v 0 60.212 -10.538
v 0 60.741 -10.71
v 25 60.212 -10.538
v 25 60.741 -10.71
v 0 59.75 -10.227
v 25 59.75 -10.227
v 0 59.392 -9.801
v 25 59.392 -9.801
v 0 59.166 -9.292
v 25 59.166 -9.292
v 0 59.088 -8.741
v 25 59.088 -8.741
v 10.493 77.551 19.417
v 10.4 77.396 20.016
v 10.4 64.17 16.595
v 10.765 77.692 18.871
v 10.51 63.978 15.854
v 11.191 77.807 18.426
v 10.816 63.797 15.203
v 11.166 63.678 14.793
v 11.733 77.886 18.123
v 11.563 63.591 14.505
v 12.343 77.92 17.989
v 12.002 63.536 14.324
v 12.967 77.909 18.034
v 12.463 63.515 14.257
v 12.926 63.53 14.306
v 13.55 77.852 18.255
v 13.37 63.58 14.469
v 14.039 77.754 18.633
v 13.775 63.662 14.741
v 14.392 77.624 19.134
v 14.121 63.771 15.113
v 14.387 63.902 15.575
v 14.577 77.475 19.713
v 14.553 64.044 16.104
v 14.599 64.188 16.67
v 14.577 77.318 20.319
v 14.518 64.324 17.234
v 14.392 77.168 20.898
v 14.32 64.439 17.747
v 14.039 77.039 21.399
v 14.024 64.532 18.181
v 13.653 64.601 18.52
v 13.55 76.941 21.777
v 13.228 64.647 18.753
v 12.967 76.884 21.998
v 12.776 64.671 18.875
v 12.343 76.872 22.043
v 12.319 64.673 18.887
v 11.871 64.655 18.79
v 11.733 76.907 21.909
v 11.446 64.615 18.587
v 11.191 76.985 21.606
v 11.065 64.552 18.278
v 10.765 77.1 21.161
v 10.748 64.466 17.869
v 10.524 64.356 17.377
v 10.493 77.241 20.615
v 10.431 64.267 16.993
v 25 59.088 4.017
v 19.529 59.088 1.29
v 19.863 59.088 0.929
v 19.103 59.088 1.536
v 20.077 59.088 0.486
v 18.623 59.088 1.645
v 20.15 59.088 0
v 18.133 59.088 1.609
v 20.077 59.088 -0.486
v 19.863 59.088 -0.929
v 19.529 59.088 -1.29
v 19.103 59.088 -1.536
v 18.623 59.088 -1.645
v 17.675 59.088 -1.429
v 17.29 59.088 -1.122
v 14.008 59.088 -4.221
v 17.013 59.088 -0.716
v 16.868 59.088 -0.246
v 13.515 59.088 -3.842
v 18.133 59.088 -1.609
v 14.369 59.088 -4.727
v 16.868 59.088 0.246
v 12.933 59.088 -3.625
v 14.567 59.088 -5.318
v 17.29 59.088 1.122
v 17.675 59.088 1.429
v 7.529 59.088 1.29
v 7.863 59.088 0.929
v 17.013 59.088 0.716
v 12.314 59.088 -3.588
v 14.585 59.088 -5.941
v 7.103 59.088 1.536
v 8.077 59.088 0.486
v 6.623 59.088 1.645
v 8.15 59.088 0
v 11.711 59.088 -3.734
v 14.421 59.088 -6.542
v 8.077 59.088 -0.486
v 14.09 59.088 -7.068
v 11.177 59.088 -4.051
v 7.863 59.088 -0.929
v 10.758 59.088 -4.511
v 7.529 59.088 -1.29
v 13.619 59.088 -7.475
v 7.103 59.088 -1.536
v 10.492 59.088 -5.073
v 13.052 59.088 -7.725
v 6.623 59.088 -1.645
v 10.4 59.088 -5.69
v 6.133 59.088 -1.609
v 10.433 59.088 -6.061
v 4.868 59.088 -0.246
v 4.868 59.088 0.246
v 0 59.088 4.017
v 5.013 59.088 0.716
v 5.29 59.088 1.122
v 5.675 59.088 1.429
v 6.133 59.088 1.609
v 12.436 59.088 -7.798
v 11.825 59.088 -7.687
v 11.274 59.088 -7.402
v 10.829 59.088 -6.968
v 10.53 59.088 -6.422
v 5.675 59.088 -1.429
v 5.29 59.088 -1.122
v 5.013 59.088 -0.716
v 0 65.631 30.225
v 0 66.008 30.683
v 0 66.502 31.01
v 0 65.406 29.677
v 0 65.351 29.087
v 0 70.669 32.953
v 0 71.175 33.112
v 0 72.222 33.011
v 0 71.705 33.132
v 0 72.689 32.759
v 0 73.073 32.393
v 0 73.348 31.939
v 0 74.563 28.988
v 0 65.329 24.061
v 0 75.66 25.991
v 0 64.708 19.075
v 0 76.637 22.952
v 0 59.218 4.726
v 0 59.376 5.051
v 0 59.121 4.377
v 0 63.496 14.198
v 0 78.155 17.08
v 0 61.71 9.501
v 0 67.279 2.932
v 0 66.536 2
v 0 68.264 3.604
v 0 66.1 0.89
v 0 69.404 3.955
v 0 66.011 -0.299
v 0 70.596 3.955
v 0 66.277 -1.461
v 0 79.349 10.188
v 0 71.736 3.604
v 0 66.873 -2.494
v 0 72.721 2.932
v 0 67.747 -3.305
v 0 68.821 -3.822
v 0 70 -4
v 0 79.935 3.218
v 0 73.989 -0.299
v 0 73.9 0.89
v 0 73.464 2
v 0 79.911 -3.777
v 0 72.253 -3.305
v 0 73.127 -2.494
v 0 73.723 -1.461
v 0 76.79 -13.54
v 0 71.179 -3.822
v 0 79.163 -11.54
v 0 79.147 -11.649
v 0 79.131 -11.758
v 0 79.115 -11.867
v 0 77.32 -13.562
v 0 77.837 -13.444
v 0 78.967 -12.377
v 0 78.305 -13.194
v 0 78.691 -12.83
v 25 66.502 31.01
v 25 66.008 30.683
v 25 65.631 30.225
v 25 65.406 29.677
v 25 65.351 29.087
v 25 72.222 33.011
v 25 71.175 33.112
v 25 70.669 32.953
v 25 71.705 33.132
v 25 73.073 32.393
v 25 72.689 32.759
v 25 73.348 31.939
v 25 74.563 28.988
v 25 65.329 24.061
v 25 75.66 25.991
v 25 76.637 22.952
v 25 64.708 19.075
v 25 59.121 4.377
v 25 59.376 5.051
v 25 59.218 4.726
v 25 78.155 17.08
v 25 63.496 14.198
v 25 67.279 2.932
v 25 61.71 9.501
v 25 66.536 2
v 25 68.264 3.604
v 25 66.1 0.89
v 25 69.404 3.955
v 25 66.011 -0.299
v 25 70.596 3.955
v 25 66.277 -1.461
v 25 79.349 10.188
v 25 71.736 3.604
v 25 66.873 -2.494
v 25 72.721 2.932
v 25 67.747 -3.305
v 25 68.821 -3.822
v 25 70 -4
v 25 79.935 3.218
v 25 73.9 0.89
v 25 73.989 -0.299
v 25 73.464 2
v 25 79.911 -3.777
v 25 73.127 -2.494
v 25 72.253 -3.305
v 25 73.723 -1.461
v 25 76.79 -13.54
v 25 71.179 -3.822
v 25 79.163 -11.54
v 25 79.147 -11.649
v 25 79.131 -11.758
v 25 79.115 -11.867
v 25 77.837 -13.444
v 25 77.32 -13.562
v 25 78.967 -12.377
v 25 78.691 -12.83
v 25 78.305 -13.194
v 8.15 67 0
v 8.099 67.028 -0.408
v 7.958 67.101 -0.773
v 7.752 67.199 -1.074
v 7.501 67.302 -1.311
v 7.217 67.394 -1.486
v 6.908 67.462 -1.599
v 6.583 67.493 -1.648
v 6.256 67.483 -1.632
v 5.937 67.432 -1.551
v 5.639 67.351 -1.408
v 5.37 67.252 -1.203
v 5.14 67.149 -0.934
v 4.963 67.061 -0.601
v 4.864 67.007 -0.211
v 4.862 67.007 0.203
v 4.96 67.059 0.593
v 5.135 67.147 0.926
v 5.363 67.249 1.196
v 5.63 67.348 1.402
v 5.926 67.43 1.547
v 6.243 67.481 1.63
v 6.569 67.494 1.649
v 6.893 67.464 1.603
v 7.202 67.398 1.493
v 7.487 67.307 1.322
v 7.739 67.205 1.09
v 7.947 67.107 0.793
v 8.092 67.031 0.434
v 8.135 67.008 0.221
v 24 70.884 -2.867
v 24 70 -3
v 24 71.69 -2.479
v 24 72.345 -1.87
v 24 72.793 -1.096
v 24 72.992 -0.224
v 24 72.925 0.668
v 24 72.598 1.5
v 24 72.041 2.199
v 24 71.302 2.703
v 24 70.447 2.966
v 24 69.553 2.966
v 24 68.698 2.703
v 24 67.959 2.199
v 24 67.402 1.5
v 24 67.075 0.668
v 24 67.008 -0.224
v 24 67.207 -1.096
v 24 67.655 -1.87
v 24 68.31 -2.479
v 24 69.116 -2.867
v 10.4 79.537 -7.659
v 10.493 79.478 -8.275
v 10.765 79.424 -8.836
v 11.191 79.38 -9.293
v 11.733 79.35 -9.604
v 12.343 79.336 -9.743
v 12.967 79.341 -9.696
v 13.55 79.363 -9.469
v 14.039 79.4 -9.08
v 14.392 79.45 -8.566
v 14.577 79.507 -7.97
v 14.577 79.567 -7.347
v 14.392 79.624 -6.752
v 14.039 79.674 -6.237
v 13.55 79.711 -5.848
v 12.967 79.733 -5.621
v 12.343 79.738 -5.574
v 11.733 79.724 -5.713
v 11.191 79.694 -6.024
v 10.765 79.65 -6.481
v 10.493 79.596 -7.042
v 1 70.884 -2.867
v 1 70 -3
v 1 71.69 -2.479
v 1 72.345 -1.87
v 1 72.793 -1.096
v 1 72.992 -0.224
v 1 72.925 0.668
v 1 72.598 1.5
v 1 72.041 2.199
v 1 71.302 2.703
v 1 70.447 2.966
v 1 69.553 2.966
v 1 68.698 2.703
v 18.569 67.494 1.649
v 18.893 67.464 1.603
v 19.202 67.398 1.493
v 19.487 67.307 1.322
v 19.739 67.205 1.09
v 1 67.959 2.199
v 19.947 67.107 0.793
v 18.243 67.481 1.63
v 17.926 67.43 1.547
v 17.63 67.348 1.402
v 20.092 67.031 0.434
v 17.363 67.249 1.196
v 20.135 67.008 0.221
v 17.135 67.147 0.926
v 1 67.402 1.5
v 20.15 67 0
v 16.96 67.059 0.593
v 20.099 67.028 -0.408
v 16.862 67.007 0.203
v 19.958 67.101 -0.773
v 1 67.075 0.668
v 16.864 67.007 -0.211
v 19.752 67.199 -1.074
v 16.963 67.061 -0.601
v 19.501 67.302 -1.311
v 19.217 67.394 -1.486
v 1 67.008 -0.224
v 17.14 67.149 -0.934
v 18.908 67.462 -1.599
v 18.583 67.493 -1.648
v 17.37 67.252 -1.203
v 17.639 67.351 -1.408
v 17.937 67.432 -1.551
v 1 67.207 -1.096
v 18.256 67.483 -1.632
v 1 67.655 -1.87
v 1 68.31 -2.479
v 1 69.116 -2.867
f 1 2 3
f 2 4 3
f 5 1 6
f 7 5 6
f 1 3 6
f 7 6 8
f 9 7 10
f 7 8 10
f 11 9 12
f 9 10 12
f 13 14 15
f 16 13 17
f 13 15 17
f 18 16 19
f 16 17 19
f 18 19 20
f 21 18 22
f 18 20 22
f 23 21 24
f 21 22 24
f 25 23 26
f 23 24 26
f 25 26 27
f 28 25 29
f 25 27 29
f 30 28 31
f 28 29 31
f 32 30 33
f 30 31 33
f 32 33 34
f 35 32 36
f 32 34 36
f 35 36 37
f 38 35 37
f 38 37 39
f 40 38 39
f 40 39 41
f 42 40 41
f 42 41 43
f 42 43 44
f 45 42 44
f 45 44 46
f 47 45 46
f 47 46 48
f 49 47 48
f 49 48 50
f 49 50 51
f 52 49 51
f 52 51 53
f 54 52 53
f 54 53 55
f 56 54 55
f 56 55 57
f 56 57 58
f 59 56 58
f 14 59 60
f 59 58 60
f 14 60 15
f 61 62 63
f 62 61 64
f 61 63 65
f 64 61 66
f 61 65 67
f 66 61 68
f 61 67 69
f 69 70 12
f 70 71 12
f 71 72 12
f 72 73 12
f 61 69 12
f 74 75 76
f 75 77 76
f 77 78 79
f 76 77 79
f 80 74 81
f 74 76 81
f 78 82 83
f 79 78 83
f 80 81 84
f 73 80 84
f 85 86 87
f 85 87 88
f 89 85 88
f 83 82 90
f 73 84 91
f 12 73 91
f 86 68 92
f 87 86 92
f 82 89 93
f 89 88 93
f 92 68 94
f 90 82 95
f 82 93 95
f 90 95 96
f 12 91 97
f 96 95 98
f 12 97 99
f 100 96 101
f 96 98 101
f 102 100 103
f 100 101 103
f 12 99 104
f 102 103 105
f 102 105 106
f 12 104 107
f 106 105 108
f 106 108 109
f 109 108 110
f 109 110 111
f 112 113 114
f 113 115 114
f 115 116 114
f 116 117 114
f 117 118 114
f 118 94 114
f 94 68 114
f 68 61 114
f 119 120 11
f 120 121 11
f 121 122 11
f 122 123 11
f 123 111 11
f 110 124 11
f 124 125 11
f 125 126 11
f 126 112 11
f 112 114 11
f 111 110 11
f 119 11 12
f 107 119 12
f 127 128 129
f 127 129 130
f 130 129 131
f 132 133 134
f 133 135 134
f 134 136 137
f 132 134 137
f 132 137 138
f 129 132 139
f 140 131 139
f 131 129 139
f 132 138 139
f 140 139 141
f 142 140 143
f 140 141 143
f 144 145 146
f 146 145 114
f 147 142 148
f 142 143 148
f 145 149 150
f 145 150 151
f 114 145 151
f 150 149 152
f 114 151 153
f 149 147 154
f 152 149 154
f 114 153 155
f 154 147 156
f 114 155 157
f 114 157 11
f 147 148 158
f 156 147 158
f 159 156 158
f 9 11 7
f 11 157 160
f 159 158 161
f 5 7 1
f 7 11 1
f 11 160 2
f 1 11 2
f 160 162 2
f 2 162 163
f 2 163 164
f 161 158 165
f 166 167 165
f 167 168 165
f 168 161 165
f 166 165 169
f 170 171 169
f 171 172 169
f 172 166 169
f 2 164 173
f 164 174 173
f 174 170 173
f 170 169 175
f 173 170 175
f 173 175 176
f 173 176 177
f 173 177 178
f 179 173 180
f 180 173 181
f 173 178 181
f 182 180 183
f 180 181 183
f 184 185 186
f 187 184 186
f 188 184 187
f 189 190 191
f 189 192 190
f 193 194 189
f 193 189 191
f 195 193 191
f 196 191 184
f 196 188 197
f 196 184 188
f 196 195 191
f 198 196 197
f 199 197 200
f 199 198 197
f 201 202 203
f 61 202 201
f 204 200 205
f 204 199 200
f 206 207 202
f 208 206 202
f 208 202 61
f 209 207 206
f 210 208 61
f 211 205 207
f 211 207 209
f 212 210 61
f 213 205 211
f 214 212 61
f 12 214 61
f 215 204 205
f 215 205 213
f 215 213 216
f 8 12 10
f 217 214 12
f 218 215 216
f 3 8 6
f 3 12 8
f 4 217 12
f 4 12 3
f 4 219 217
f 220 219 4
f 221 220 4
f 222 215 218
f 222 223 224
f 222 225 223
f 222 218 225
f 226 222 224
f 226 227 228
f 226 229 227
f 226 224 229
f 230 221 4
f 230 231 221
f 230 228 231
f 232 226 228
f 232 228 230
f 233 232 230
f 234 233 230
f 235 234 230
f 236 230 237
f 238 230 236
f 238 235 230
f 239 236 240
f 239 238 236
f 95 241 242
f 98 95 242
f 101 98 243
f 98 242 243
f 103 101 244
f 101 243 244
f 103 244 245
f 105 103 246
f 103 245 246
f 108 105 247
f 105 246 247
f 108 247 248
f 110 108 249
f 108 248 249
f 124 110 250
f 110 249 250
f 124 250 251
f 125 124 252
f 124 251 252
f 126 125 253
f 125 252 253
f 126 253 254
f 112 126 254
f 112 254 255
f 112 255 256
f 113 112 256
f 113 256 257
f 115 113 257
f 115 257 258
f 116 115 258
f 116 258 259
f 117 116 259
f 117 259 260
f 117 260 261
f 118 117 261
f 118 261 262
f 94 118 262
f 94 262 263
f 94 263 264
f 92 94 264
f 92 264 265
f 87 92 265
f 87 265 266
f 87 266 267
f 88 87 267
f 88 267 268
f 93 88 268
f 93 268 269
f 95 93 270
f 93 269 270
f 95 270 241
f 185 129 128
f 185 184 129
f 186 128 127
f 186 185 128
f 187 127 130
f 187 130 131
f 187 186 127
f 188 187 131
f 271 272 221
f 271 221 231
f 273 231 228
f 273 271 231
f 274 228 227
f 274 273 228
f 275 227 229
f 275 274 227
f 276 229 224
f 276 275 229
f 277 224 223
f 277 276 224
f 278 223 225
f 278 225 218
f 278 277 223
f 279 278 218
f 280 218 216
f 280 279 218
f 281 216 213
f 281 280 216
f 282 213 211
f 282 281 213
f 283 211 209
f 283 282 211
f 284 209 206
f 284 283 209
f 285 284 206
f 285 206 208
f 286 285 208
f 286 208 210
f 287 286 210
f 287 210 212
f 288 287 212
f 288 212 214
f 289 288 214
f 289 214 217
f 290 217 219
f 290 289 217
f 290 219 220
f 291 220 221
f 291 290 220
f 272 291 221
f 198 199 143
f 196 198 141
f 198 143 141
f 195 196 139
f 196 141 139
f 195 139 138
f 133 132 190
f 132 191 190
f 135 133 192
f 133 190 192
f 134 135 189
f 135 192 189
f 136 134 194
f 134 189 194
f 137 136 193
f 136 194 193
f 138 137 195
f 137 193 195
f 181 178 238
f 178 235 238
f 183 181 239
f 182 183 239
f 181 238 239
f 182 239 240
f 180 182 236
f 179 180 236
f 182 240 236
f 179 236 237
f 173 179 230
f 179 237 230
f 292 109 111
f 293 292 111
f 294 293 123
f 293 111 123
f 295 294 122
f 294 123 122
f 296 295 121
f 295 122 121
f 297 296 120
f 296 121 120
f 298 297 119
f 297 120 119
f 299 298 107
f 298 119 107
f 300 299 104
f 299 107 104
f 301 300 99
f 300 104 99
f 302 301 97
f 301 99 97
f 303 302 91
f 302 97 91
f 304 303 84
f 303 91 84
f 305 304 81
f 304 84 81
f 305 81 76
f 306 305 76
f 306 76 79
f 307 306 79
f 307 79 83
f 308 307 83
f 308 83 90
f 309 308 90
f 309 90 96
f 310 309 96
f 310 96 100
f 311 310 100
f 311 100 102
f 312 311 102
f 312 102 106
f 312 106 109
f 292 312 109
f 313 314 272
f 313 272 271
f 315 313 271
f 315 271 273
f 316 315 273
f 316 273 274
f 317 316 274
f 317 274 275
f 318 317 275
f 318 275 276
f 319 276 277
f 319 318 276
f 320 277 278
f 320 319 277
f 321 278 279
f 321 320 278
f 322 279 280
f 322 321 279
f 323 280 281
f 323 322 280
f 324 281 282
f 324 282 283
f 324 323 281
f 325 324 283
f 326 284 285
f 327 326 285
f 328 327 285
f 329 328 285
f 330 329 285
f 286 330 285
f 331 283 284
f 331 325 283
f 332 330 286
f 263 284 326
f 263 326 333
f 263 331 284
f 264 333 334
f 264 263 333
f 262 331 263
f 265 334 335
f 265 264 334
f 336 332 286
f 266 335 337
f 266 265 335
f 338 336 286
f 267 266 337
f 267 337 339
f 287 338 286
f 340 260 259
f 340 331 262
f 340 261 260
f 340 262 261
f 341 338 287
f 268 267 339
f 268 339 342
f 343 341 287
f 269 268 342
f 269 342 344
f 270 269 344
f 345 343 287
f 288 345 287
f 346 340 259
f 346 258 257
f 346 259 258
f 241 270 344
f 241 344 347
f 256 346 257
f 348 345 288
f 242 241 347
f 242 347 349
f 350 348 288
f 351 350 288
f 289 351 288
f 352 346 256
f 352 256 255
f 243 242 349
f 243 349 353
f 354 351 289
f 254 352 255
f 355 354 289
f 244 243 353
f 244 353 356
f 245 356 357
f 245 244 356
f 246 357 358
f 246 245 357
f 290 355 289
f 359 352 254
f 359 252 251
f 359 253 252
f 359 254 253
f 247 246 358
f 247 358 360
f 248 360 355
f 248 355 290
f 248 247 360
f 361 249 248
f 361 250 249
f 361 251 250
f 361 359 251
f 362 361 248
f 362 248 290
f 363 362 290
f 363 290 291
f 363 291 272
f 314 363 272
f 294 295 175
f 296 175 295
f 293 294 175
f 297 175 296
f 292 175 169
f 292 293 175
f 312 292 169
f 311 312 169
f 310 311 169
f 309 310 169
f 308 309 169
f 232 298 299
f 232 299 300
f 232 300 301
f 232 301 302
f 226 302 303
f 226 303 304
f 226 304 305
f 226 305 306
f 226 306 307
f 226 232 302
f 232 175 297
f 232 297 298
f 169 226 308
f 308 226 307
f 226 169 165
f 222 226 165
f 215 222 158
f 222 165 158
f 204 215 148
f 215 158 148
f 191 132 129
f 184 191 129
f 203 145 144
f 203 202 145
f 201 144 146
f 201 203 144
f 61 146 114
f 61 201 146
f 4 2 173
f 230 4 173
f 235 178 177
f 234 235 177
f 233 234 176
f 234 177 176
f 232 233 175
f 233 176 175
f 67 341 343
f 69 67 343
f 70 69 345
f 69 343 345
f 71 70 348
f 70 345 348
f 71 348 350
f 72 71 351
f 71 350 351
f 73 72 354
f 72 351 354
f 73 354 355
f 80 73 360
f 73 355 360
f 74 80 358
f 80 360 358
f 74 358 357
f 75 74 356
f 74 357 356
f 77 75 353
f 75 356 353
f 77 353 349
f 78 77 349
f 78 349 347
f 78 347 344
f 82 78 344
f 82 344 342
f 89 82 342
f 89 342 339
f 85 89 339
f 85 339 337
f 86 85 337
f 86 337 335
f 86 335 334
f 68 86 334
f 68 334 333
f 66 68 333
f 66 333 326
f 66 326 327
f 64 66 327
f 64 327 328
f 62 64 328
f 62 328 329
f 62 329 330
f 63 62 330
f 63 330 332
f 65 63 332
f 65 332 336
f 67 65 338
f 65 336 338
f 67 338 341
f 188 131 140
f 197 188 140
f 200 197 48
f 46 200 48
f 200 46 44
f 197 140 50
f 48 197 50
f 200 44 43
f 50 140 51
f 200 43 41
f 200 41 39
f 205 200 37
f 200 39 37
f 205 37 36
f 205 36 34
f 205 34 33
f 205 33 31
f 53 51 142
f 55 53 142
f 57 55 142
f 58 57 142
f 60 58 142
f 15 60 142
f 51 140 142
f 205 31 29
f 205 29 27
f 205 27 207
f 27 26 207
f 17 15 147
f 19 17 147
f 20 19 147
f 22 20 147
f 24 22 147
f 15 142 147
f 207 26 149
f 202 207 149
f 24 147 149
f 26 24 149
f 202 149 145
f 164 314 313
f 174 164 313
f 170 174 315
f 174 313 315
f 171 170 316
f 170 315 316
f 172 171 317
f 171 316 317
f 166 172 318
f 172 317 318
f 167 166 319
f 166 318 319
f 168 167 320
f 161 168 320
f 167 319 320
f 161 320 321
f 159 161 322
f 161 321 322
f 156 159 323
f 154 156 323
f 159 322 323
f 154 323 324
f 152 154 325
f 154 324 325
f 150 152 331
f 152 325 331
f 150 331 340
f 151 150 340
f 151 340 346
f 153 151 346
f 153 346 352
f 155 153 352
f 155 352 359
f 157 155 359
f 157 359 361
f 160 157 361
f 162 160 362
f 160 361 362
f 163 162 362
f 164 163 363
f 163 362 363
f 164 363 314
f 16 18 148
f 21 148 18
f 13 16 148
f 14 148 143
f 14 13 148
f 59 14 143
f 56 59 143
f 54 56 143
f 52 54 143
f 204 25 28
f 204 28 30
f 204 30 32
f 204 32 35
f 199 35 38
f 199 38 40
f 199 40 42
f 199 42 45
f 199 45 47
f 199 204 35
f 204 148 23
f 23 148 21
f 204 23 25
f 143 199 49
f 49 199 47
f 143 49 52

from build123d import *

# Parameters (mm, degrees)
SKETCH1_R             = 3
BOSS_EXTRUDE1_DEPTH   = 25
FILLET2_R             = 2
CUT_EXTRUDE1_DEPTH    = 26
M5_TAPPED_HOLE1_D     = 4.2
M5_TAPPED_HOLE1_DEPTH = 22.4
M5_TAPPED_HOLE1_TIP   = 1.2618073
M5_TAPPED_HOLE2_D     = 4.2
M5_TAPPED_HOLE2_DEPTH = 22.4
M5_TAPPED_HOLE2_TIP   = 1.2618073
M4_TAPPED_HOLE1_D     = 3.3
M4_TAPPED_HOLE1_DEPTH = 10.1
M4_TAPPED_HOLE1_TIP   = 0.991420021
CHAMFER1_SIZE         = 1


with BuildPart() as part:
    # Sketch1 → Boss-Extrude1 (new body)
    with BuildSketch(Plane(origin=(0, 0, 0), x_dir=(0, 0, -1), z_dir=(1, 0, 0))):
        with BuildLine():
            Line((-33.809460939, 72.504622963), (-30.428514845, 65.254160667))
            ThreePointArc((-30.428514845, 65.254160667), (-17.004346403, 64.269330845), (-4.58110934, 59.088465181))
            Line((-4.58110934, 59.088465181), (10.41889066, 59.088465181))
            Line((10.41889066, 59.088465181), (13.891854213, 78.784620241))
            ThreePointArc((13.891854213, 78.784620241), (-10.442095378, 79.31558891), (-33.809460939, 72.504622963))
        make_face()
        with Locations((0, 70)):
            Circle(SKETCH1_R, mode=Mode.SUBTRACT)
    extrude(amount=BOSS_EXTRUDE1_DEPTH)

    # Fillet2
    fillet2_edges = [part.edges().sort_by_distance(p)[0] for p in [
        (12.5, 59.088465181, 4.58110934),
        (12.5, 65.254160667, 30.428514845),
        (12.5, 72.504622963, 33.809460939),
        (12.5, 78.784620241, -13.891854213),
        (12.5, 59.088465181, -10.41889066),
    ]]
    fillet(fillet2_edges, radius=FILLET2_R)

    # Sketch3 → Cut-Extrude1 (cut, through all)
    with BuildSketch(Plane(origin=(25, 0, 0), x_dir=(0, 0, -1), z_dir=(1, 0, 0))):
        Polygon((-23.953386268, 80.509473559), (-18.081663619, 82.028004286), (-17.080143603, 78.155413725), (-22.951866252, 76.636882997), align=None)
        Polygon((3.776986852, 89.910790074), (11.540104609, 89.163286855), (11.540104609, 79.163286855), (3.776986852, 79.910790074), align=None)
    extrude(amount=-CUT_EXTRUDE1_DEPTH, mode=Mode.SUBTRACT)

    # M5 Tapped Hole1
    with Locations(Plane(origin=(0, 77.396148361, 20.016004928), x_dir=(1, 0, 0), z_dir=(0, 0.96814764, 0.250380004))):
        with Locations((12.5, 0)):
            Hole(M5_TAPPED_HOLE1_D / 2, depth=M5_TAPPED_HOLE1_DEPTH)
            with Locations((0, 0, -(M5_TAPPED_HOLE1_DEPTH + M5_TAPPED_HOLE1_TIP / 2))):  # 118° drill point
                Cone(0, M5_TAPPED_HOLE1_D / 2, M5_TAPPED_HOLE1_TIP, mode=Mode.SUBTRACT)

    # M5 Tapped Hole2
    with Locations(Plane(origin=(0, 79.537038465, -7.65854573), x_dir=(1, 0, 0), z_dir=(0, 0.995396198, -0.095845753))):
        with Locations((12.5, 0)):
            Hole(M5_TAPPED_HOLE2_D / 2, depth=M5_TAPPED_HOLE2_DEPTH)
            with Locations((0, 0, -(M5_TAPPED_HOLE2_DEPTH + M5_TAPPED_HOLE2_TIP / 2))):  # 118° drill point
                Cone(0, M5_TAPPED_HOLE2_D / 2, M5_TAPPED_HOLE2_TIP, mode=Mode.SUBTRACT)

    # M4 Tapped Hole1
    with Locations(Plane(origin=(0, 59.088465181, 0), x_dir=(-1, 0, 0), z_dir=(0, -1, 0))):
        with Locations((-6.5, 0), (-18.5, 0)):
            Hole(M4_TAPPED_HOLE1_D / 2, depth=M4_TAPPED_HOLE1_DEPTH)
            with Locations((0, 0, -(M4_TAPPED_HOLE1_DEPTH + M4_TAPPED_HOLE1_TIP / 2))):  # 118° drill point
                Cone(0, M4_TAPPED_HOLE1_D / 2, M4_TAPPED_HOLE1_TIP, mode=Mode.SUBTRACT)

    # Chamfer1
    chamfer1_edges = [part.edges().sort_by_distance(p)[0] for p in [
        (25, 70, 3),
        (0, 70, 3),
    ]]
    chamfer(chamfer1_edges, length=CHAMFER1_SIZE)


solid = part.part
